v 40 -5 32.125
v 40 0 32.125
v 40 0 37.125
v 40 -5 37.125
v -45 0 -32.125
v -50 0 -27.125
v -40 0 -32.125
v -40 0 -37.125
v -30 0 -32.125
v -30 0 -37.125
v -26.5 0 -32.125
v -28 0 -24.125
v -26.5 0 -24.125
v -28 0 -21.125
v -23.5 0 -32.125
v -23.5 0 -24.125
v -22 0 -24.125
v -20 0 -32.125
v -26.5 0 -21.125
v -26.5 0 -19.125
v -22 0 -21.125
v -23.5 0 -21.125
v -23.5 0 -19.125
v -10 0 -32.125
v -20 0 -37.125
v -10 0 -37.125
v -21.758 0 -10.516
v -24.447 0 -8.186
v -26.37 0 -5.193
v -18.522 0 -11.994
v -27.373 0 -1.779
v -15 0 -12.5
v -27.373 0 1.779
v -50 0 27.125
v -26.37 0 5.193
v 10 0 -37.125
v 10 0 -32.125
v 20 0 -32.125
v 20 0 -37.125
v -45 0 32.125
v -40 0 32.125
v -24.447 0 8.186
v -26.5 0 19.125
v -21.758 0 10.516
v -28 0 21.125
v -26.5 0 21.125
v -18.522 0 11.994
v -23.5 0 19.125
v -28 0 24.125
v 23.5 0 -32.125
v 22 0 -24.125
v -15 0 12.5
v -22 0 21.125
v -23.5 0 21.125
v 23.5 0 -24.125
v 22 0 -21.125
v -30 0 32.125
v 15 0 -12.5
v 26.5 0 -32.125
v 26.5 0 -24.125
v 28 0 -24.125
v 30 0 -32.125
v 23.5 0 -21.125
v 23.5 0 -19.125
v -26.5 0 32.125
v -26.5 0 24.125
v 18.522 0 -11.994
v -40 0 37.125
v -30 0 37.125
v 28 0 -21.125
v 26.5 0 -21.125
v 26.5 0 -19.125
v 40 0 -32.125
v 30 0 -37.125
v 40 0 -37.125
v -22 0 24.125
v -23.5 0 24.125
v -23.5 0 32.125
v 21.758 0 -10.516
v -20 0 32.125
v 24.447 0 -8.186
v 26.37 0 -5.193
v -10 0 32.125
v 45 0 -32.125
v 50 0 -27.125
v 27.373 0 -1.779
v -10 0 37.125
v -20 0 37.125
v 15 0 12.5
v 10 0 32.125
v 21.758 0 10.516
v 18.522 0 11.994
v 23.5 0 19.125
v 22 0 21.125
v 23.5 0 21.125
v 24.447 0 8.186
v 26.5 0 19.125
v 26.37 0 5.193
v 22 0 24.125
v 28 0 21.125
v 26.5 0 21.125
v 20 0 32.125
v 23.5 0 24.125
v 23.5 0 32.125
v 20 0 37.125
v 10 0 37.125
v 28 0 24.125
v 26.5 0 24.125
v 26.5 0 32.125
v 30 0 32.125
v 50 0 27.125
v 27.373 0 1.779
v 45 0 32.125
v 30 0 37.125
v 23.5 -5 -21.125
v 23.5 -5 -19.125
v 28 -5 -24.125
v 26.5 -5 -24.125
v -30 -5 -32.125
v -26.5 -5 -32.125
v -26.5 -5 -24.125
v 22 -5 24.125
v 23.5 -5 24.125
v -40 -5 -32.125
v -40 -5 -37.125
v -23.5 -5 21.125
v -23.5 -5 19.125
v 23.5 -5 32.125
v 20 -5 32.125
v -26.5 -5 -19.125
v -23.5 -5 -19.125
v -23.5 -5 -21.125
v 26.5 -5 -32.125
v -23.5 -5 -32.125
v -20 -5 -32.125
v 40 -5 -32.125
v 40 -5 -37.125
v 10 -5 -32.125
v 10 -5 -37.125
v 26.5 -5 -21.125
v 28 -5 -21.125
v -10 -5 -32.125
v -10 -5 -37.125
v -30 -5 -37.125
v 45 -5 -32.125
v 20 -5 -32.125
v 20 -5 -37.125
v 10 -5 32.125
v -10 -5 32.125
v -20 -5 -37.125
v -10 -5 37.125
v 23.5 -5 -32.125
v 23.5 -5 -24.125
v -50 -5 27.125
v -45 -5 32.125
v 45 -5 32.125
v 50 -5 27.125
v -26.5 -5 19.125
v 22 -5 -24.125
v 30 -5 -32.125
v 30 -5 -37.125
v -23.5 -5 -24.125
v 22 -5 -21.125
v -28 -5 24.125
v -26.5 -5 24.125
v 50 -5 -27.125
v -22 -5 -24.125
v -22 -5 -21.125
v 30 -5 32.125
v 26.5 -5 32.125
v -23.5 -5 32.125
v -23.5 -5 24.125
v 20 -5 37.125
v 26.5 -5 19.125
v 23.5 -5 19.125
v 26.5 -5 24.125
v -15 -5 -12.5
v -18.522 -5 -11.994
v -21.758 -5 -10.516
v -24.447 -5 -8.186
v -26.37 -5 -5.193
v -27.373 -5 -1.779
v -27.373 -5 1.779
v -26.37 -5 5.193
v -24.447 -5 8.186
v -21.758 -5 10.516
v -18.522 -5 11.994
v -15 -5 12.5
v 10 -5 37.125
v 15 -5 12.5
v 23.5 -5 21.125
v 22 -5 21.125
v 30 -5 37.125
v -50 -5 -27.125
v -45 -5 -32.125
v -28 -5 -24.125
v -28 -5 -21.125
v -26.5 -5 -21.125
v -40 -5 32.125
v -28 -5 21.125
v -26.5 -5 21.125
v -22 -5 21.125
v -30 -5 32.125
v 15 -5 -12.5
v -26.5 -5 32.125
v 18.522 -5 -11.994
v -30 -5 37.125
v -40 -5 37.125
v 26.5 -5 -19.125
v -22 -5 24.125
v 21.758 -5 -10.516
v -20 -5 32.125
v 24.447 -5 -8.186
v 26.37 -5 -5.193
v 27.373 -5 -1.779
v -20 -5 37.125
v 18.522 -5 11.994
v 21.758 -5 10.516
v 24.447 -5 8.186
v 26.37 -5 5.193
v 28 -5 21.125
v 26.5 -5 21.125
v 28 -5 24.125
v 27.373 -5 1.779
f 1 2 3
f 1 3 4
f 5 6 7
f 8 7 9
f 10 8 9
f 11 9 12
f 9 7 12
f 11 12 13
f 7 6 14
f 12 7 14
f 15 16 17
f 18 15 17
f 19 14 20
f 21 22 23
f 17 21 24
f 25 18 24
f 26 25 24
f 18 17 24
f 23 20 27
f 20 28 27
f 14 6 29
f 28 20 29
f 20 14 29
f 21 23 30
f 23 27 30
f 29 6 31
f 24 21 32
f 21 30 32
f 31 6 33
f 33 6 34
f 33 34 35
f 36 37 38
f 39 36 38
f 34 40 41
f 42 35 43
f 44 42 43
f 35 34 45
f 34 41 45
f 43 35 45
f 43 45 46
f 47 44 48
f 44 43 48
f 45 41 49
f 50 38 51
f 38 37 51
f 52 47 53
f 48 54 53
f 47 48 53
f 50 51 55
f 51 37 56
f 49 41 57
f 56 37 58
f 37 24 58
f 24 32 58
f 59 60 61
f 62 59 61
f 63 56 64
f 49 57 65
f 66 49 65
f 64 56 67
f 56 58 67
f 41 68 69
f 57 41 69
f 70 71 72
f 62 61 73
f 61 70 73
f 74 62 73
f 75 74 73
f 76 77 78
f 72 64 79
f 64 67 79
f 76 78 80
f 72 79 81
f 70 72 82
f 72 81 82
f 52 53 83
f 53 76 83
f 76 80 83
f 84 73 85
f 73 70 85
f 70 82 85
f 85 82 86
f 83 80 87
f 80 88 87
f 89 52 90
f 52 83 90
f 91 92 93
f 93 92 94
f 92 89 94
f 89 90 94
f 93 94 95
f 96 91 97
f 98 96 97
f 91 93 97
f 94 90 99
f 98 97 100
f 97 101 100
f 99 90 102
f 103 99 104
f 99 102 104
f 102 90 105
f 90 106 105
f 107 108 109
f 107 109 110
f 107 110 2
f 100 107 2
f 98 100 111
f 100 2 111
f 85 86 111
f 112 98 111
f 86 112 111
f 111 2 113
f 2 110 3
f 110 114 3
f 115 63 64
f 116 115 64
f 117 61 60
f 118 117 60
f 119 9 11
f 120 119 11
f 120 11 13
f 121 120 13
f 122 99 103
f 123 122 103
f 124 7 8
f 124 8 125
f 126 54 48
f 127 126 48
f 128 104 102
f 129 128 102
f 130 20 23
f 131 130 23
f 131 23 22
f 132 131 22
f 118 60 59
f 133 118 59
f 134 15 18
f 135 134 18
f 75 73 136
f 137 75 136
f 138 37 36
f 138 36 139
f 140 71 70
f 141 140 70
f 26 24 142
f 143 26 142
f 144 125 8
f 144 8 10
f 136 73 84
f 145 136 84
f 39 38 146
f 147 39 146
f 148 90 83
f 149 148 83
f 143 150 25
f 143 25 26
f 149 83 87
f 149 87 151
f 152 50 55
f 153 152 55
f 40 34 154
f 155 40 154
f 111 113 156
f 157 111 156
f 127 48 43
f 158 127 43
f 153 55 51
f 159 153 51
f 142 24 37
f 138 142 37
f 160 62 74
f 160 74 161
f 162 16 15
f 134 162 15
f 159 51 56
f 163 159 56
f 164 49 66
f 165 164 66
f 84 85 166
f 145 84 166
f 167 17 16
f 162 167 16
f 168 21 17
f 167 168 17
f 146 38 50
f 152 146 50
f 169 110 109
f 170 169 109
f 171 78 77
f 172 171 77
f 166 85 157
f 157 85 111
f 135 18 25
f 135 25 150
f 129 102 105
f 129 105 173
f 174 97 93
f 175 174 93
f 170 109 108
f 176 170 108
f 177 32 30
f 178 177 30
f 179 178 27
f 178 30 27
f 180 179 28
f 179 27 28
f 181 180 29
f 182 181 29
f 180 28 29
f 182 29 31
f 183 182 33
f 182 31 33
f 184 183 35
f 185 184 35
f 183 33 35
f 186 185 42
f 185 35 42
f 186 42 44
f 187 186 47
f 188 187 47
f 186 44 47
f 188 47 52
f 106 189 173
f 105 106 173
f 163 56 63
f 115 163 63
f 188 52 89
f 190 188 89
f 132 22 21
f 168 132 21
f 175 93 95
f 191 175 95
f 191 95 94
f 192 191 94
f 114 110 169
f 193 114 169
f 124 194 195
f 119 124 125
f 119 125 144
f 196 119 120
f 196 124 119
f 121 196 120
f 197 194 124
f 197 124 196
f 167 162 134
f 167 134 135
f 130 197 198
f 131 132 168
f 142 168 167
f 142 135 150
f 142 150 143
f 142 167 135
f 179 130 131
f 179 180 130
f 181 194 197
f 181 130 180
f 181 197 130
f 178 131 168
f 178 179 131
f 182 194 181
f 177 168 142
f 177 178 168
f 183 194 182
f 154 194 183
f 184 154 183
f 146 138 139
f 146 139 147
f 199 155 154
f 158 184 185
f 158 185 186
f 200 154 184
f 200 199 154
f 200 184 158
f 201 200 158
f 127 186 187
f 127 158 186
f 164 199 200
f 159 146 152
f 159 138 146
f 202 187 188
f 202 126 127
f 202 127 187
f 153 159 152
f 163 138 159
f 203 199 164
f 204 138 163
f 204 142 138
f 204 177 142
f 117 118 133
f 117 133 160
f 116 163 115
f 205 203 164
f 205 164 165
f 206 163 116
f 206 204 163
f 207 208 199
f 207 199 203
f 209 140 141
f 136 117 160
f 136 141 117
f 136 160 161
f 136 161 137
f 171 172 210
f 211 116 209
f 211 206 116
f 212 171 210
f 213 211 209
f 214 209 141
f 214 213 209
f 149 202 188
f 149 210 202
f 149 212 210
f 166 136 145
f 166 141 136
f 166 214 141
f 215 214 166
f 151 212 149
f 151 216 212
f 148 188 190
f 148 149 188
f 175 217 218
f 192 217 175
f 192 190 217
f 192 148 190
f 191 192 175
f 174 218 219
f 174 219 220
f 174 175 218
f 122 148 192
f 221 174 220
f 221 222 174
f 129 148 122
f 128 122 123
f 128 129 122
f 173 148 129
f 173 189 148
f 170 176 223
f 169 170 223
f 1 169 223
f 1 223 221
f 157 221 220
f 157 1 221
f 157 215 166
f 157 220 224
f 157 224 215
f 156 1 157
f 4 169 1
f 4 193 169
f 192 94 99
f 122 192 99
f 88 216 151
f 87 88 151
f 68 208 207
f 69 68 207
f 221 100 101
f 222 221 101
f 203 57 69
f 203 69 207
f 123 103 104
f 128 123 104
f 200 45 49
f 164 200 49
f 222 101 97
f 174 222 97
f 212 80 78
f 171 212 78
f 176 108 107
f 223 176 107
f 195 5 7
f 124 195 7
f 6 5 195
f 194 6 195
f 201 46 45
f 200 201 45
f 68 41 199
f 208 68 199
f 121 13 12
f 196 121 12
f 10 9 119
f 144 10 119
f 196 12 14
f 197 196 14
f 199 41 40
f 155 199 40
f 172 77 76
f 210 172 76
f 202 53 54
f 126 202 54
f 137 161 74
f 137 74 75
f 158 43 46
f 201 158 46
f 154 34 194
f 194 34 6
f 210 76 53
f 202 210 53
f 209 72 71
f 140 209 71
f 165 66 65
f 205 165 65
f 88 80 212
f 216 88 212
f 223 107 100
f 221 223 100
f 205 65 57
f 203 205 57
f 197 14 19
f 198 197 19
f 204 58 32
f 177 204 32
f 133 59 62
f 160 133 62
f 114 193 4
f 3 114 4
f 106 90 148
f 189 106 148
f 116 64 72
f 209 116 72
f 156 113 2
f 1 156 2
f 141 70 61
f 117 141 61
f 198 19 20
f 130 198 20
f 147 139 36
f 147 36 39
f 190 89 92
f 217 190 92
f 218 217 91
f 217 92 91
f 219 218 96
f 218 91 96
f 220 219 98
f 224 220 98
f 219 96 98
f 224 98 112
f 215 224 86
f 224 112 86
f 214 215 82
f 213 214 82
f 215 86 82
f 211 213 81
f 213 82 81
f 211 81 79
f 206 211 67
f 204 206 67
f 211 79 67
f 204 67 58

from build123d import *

# Parameters (mm, degrees)
F1_DEPTH = 5
F2_SIZE  = 5
F3_W     = 10
F3_H     = 5
F4_DEPTH = 5


# Not quite as in the source:
# - a pattern or mirror of a feature is missing from the dataset's text; its kind, count and spacing are read off the source's solid


with BuildPart() as f1:
    # F0 (on Front) → F1 (new body)
    with BuildSketch(Plane.XZ):
        Polygon((-26.5, 32.125), (-50, 32.125), (-50, -32.125), (-26.5, -32.125), (-26.5, -24.125), (-28, -24.125), (-28, -21.125), (-26.5, -21.125), (-26.5, -19.125), (-25, -19.125), (-23.5, -19.125), (-23.5, -21.125), (-22, -21.125), (-22, -24.125), (-23.5, -24.125), (-23.5, -32.125), (-1.5, -32.125), (-1.5, -24.125), (-3, -24.125), (-3, -21.125), (-1.5, -21.125), (-1.5, -19.125), (0, -19.125), (1.5, -19.125), (1.5, -21.125), (3, -21.125), (3, -24.125), (1.5, -24.125), (1.5, -32.125), (23.5, -32.125), (23.5, -24.125), (22, -24.125), (22, -21.125), (23.5, -21.125), (23.5, -19.125), (25, -19.125), (26.5, -19.125), (26.5, -21.125), (28, -21.125), (28, -24.125), (26.5, -24.125), (26.5, -32.125), (50, -32.125), (50, 32.125), (26.5, 32.125), (26.5, 24.125), (28, 24.125), (28, 21.125), (26.5, 21.125), (26.5, 19.125), (25, 19.125), (23.5, 19.125), (23.5, 21.125), (22, 21.125), (22, 24.125), (23.5, 24.125), (23.5, 32.125), (1.5, 32.125), (1.5, 24.125), (3, 24.125), (3, 21.125), (1.5, 21.125), (1.5, 19.125), (0, 19.125), (-1.5, 19.125), (-1.5, 21.125), (-3, 21.125), (-3, 24.125), (-1.5, 24.125), (-1.5, 32.125), (-23.5, 32.125), (-23.5, 24.125), (-22, 24.125), (-22, 21.125), (-23.5, 21.125), (-23.5, 19.125), (-25, 19.125), (-26.5, 19.125), (-26.5, 21.125), (-28, 21.125), (-28, 24.125), (-26.5, 24.125), align=None)
        with BuildLine():
            Line((15, -12.5), (-15, -12.5))
            ThreePointArc((-15, -12.5), (-27.5, 0), (-15, 12.5))
            Line((-15, 12.5), (15, 12.5))
            ThreePointArc((15, 12.5), (27.5, 0), (15, -12.5))
        make_face(mode=Mode.SUBTRACT)
        Polygon((1.5, 32.125), (-1.5, 32.125), (-1.5, 24.125), (-3, 24.125), (-3, 21.125), (-1.5, 21.125), (-1.5, 19.125), (0, 19.125), (1.5, 19.125), (1.5, 21.125), (3, 21.125), (3, 24.125), (1.5, 24.125), align=None)
        Polygon((-1.5, -24.125), (-1.5, -32.125), (1.5, -32.125), (1.5, -24.125), (3, -24.125), (3, -21.125), (1.5, -21.125), (1.5, -19.125), (0, -19.125), (-1.5, -19.125), (-1.5, -21.125), (-3, -21.125), (-3, -24.125), align=None)
    extrude(amount=F1_DEPTH)

    # F2
    f2_edges = [f1.edges().sort_by_distance(p)[0] for p in [
        (-50, -2.5, 32.125),
        (50, -2.5, 32.125),
        (-50, -2.5, -32.125),
        (50, -2.5, -32.125),
    ]]
    chamfer(f2_edges, length=F2_SIZE)

    # F3 (on face) → F4 (join)
    with BuildSketch(Plane(origin=(0, 0, -32.125), x_dir=(1, 0, 0), z_dir=(0, 0, -1))):
        with Locations((35, 2.5)):
            Rectangle(F3_W, F3_H)
        with Locations((15, 2.5)):
            Rectangle(F3_W, F3_H)
        with Locations((-15, 2.5)):
            Rectangle(F3_W, F3_H)
        with Locations((-35, 2.5)):
            Rectangle(F3_W, F3_H)
    f4 = extrude(amount=F4_DEPTH)

    # F4_copies: F4 across plane
    add(f4.mirror(Plane.XY))


solid = f1.part
